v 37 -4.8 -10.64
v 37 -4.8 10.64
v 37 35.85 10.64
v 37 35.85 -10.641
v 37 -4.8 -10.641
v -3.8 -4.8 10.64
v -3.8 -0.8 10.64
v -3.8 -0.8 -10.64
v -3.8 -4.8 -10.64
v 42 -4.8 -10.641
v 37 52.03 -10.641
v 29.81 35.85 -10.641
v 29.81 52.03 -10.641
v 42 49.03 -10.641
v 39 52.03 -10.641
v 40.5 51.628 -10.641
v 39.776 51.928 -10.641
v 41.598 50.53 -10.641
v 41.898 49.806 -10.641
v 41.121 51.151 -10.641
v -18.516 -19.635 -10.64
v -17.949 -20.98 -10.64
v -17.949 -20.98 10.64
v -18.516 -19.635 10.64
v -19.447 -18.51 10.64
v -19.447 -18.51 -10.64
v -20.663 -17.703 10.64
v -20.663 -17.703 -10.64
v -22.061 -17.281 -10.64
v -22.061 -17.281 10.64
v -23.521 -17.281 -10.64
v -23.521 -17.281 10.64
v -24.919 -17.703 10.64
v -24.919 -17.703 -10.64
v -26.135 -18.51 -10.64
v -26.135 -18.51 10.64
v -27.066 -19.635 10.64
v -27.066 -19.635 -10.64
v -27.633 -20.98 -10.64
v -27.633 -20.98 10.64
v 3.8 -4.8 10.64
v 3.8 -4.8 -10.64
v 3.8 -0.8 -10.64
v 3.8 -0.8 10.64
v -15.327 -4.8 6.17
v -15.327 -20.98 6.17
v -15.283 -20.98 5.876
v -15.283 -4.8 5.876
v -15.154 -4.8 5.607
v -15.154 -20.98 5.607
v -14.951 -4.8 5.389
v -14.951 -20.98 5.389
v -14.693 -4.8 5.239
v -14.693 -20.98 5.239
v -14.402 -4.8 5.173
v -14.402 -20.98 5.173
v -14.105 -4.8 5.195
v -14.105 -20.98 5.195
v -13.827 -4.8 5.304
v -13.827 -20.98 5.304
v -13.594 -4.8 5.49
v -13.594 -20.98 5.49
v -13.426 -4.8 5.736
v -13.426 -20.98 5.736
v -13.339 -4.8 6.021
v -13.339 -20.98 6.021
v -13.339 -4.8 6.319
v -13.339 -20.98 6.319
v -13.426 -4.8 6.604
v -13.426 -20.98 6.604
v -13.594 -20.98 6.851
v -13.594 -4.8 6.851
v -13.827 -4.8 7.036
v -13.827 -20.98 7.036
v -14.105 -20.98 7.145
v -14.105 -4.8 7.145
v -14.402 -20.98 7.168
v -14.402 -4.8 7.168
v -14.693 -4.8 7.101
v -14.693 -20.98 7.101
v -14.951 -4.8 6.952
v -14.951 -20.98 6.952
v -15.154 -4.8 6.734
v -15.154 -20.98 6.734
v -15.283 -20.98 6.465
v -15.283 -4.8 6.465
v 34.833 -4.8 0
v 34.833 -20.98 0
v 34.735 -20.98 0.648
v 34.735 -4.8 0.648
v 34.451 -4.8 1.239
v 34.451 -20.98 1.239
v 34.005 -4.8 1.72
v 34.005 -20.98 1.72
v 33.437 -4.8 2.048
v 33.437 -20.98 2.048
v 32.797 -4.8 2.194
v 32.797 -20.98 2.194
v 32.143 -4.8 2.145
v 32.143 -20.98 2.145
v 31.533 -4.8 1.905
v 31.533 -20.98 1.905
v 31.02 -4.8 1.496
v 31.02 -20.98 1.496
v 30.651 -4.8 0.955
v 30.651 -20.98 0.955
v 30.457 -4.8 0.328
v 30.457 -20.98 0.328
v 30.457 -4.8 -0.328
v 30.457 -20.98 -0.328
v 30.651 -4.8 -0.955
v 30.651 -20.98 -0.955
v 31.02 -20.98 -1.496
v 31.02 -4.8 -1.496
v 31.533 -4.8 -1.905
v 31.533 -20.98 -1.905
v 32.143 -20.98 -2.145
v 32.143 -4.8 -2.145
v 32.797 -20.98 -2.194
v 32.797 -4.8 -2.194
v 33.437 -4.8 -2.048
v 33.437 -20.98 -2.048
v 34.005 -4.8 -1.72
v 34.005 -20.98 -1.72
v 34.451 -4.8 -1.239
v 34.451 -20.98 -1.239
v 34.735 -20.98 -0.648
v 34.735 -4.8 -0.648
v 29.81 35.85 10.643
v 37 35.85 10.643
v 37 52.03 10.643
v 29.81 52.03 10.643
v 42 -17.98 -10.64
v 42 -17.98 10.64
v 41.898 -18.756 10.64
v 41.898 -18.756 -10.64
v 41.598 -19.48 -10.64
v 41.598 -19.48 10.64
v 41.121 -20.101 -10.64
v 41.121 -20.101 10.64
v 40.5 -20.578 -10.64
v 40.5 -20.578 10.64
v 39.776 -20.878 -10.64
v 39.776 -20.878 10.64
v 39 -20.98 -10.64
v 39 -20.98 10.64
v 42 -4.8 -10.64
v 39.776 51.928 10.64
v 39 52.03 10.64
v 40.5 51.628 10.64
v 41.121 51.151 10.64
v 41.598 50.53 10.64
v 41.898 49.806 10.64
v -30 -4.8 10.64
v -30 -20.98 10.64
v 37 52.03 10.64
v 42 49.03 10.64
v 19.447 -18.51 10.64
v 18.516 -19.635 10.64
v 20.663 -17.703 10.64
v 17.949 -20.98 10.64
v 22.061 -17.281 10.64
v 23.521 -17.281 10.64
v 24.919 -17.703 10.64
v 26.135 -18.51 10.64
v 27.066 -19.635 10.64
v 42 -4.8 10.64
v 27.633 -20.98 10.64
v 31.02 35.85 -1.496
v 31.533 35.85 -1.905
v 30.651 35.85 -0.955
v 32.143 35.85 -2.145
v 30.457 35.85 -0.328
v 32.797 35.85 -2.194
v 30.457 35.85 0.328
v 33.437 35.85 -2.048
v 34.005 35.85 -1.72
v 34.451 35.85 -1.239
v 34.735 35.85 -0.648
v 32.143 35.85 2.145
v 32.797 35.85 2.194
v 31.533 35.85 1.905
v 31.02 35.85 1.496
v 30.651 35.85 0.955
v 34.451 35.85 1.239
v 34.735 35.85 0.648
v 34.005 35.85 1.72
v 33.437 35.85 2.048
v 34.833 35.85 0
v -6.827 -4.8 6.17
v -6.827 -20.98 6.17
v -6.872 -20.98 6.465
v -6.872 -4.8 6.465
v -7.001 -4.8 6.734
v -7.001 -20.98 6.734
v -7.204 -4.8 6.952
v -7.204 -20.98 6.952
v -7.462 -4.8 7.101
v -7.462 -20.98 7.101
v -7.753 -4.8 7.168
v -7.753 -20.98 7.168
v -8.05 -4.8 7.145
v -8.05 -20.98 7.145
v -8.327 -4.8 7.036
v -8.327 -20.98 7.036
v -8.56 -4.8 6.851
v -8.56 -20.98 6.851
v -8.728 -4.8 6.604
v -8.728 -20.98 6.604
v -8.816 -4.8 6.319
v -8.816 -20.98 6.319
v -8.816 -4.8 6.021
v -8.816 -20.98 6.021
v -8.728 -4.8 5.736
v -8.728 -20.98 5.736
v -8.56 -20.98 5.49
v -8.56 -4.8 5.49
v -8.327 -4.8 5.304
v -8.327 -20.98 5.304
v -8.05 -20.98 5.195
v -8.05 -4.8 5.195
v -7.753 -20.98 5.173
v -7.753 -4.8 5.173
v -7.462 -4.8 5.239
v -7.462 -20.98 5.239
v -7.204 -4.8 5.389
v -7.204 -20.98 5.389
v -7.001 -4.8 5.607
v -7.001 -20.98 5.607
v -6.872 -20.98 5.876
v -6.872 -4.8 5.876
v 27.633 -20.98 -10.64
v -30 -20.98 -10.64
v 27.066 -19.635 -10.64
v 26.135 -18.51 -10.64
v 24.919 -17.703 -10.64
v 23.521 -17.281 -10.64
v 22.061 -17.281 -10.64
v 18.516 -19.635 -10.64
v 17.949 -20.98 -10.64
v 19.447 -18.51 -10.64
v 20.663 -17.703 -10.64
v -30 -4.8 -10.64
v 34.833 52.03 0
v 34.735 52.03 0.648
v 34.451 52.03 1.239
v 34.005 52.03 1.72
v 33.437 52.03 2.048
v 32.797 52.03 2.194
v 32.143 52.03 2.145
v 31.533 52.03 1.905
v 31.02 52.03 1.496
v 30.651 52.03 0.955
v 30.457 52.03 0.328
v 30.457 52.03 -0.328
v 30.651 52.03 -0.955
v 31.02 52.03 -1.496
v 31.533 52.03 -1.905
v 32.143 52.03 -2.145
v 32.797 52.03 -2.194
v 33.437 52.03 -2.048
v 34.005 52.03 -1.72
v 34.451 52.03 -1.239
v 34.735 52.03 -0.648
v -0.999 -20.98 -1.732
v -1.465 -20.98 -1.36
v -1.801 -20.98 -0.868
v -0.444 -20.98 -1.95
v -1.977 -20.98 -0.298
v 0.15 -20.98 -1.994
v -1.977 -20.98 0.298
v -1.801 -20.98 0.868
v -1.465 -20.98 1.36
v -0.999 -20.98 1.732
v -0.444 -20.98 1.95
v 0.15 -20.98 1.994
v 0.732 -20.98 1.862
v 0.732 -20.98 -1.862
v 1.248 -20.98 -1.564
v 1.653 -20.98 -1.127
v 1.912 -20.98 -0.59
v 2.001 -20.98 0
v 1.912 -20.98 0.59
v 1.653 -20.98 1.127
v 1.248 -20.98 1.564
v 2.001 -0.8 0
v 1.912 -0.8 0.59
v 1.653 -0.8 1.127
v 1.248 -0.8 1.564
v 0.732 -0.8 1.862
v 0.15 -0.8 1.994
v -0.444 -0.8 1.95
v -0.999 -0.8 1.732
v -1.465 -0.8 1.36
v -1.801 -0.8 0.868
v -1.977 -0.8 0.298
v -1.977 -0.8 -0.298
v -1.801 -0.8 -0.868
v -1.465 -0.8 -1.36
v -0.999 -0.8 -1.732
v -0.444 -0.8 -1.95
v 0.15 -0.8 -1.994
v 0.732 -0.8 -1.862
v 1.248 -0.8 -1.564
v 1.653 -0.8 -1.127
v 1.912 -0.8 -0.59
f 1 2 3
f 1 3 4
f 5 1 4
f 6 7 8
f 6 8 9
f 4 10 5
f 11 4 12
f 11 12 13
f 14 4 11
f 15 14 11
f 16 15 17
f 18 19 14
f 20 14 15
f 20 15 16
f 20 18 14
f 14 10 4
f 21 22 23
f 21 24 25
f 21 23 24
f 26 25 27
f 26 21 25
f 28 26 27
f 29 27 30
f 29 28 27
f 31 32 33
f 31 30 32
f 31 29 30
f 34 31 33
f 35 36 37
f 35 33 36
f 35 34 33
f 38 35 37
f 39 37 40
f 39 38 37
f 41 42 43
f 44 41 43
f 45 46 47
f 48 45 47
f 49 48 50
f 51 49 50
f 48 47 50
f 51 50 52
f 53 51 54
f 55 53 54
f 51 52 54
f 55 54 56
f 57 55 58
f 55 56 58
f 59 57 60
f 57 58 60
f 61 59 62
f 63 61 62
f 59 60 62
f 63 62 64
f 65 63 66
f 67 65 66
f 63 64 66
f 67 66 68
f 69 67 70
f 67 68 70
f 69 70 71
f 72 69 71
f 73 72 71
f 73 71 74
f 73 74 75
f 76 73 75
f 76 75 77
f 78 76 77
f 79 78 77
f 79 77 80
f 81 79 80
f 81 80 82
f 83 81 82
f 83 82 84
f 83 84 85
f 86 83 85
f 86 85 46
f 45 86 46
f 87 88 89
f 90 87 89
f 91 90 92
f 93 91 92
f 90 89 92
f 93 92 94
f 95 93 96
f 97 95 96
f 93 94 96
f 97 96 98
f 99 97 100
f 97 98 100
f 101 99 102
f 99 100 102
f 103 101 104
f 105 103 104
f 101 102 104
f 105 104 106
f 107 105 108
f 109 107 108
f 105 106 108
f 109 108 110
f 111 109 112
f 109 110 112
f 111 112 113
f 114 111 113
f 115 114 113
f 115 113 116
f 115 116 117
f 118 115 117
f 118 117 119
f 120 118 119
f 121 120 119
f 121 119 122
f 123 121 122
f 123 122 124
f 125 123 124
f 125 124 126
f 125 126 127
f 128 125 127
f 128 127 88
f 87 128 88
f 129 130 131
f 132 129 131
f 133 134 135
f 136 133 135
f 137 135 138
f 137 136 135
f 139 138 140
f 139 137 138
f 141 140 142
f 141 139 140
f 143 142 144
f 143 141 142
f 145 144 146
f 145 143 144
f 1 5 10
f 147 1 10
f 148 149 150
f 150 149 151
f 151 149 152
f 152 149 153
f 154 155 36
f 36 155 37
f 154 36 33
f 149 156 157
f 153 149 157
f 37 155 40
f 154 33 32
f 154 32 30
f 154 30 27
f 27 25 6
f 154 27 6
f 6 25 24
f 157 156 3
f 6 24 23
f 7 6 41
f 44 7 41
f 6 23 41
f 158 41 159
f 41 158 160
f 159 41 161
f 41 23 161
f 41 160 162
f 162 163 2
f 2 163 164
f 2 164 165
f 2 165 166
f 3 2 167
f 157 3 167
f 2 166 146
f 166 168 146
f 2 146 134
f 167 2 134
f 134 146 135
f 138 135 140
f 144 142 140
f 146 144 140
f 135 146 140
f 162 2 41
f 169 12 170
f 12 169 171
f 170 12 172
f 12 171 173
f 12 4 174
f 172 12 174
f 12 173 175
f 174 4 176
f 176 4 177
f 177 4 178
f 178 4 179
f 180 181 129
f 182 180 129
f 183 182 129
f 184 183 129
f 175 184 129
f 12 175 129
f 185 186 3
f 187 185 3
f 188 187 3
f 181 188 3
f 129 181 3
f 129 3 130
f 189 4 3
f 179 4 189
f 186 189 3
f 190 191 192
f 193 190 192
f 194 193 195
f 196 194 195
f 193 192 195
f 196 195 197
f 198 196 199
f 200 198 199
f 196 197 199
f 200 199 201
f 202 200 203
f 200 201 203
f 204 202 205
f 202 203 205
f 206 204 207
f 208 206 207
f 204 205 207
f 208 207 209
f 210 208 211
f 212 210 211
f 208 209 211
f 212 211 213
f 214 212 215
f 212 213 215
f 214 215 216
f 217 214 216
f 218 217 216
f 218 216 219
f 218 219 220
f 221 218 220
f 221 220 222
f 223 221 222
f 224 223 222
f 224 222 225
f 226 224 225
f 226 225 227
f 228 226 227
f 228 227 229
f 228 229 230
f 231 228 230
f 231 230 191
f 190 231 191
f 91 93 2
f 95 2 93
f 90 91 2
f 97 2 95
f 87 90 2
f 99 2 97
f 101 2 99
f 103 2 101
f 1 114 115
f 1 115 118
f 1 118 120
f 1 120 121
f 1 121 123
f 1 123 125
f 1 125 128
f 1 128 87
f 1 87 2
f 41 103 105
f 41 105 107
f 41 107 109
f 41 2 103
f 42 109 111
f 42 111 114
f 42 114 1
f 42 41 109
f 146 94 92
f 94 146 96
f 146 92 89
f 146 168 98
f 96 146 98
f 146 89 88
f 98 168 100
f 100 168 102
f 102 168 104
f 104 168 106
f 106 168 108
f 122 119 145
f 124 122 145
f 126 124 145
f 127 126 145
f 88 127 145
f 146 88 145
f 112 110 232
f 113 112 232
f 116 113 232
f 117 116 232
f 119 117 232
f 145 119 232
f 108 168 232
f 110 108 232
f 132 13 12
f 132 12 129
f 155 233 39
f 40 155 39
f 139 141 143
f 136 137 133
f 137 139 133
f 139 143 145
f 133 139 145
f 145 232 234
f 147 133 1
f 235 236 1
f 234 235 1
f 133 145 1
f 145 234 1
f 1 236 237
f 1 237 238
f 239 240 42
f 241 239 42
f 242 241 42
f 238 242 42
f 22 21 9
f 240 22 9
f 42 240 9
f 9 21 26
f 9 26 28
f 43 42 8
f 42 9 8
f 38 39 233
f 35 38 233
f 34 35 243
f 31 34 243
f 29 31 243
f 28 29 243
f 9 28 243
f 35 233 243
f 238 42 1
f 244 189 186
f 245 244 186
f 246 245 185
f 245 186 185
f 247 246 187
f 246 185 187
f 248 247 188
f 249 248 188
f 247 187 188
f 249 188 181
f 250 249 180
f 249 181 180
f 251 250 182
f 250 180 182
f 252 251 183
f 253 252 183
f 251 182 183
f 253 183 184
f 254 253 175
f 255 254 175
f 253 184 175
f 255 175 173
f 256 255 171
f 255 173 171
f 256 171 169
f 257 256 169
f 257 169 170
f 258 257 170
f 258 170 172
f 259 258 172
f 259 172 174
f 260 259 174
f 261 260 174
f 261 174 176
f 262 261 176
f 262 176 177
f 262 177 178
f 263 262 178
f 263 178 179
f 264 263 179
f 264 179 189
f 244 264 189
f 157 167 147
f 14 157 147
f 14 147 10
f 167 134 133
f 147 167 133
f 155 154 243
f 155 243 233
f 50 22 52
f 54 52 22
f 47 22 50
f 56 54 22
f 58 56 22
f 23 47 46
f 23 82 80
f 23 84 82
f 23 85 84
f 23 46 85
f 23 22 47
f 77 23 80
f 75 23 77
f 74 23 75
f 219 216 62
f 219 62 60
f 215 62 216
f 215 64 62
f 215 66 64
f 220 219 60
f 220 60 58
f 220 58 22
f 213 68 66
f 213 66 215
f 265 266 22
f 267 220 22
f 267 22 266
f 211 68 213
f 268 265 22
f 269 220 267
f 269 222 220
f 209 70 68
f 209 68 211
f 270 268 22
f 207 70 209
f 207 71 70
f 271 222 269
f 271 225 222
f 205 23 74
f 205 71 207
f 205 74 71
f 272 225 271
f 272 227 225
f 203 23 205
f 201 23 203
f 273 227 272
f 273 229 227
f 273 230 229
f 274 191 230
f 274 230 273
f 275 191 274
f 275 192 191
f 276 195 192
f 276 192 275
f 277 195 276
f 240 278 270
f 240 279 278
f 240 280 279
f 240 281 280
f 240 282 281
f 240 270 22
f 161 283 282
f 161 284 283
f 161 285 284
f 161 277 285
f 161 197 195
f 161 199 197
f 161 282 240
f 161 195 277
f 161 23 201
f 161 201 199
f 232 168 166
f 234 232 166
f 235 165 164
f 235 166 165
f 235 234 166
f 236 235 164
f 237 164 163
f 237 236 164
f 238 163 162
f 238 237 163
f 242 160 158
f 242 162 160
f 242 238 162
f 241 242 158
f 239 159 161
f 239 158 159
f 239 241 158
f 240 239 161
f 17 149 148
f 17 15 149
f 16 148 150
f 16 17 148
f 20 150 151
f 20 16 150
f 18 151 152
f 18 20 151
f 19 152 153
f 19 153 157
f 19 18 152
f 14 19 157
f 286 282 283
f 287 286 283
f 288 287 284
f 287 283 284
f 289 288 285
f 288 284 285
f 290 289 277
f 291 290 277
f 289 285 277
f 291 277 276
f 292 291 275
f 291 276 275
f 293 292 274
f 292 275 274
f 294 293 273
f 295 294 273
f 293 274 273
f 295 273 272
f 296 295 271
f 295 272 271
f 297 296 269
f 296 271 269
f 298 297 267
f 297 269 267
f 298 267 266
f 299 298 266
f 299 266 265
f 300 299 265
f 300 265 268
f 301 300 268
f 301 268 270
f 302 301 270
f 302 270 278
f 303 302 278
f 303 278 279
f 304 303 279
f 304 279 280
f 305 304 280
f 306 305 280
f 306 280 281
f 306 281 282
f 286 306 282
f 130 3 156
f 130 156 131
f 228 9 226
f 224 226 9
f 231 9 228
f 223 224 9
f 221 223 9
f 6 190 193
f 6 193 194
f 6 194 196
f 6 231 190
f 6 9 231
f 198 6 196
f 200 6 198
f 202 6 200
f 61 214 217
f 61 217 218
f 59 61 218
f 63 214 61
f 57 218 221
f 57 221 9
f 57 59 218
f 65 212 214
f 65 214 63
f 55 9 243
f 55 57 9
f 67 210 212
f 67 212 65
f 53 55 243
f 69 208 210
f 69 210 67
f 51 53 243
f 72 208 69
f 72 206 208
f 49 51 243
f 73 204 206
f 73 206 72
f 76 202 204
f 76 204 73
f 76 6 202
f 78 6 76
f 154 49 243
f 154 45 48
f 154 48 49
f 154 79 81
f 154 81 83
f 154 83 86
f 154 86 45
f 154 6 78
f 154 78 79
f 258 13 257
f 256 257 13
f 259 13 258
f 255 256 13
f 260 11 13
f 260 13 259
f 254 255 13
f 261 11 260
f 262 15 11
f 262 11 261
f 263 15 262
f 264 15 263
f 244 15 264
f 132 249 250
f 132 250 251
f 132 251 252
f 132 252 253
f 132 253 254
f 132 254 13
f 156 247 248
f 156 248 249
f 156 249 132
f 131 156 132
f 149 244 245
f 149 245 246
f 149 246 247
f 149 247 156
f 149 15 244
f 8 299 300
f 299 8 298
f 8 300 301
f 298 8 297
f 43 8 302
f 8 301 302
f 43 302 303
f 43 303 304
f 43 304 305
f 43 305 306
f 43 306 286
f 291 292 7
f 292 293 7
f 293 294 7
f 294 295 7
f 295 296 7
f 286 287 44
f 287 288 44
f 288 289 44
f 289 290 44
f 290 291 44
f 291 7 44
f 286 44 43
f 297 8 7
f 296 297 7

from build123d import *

# Parameters (mm, degrees)
BOSS_EXTRUDE1_DEPTH     = 10.8
BOSS_EXTRUDE2_DEPTH     = 10.64
CUT_EXTRUDE1_DEPTH      = 39.168054705
CUT_EXTRUDE1_DEPTH_BACK = 39.168054705
SKETCH5_R               = 5
FILLET1_R               = 1
SKETCH6_W               = 21.28
SKETCH6_H               = 16.18
BOSS_EXTRUDE3_DEPTH     = 12
SKETCH7_W               = 5
SKETCH7_H               = 21.281328743
BOSS_EXTRUDE4_DEPTH     = 56.83
SKETCH8_W               = 21.284331222
SKETCH8_H               = 16.18
BOSS_EXTRUDE5_DEPTH     = 7.19
FILLET3_R               = 3
SKETCH9_R               = 2.2
CUT_EXTRUDE2_DEPTH      = 85.918196519
SKETCH10_R              = 2
CUT_EXTRUDE3_DEPTH      = 85.918196519
SKETCH11_W              = 24.977296572
SKETCH11_H              = 9.721484234
CUT_EXTRUDE4_DEPTH      = 71.220021919
CUT_EXTRUDE5_REACH      = 86.898


with BuildPart() as part:
    # Sketch2 → Boss-Extrude1 (new body)
    with BuildSketch(Plane.XY):
        Polygon((-10.1, 0), (0, 0), (0, 7), (-6.25480432, 7), (-10.1, 1.709943763), align=None)
        Polygon((0, 0), (10.1, 0), (10.1, 1.709943763), (6.25480432, 7), (0, 7), align=None)
    extrude(amount=BOSS_EXTRUDE1_DEPTH)

    # Sketch4 → Boss-Extrude2 (add, symmetric)
    with BuildSketch(Plane.XY):
        Polygon((-3.8, 0), (-3.8, -4.8), (-30, -4.8), (-30, -20.98), (30, -20.98), (30, -4.8), (3.8, -4.8), (3.8, 0), align=None)
    extrude(amount=BOSS_EXTRUDE2_DEPTH, both=True)

    # Sketch5 → Cut-Extrude1 (cut, two sides: drawn at the far end of the back side and taken through both)
    with BuildSketch(Plane.XY.offset(-CUT_EXTRUDE1_DEPTH_BACK)):
        with Locations((-22.790976064, -22.227391232)):
            Circle(SKETCH5_R)
        with Locations((22.790976064, -22.227391232)):
            Circle(SKETCH5_R)
    extrude(amount=CUT_EXTRUDE1_DEPTH + CUT_EXTRUDE1_DEPTH_BACK, mode=Mode.SUBTRACT)

    # Fillet1
    fillet1_edges = [part.edges().sort_by_distance(p)[0] for p in [
        (-10.1, 0, 5.4),
        (-10.1, 1.709943763, 5.4),
        (-6.25480432, 7, 5.4),
        (6.25480432, 7, 5.4),
        (10.1, 1.709943763, 5.4),
        (10.1, 0, 5.4),
    ]]
    fillet(fillet1_edges, radius=FILLET1_R)

    # Sketch6 → Boss-Extrude3 (add)
    with BuildSketch(Plane(origin=(30, 0, 0), x_dir=(0, 0, -1), z_dir=(1, 0, 0))):
        with Locations((0, -12.89)):
            Rectangle(SKETCH6_W, SKETCH6_H)
    extrude(amount=BOSS_EXTRUDE3_DEPTH)

    # Sketch7 → Boss-Extrude4 (add)
    with BuildSketch(Plane(origin=(0, -4.8, 0), x_dir=(1, 0, 0), z_dir=(0, 1, 0))):
        with Locations((39.5, 0.000664372)):
            Rectangle(SKETCH7_W, SKETCH7_H)
    extrude(amount=BOSS_EXTRUDE4_DEPTH)

    # Sketch8 → Boss-Extrude5 (add)
    with BuildSketch(Plane.ZY.offset(-37)):
        with Locations((0.000836868, 43.94)):
            Rectangle(SKETCH8_W, SKETCH8_H)
    extrude(amount=BOSS_EXTRUDE5_DEPTH)

    # Fillet3
    fillet3_edges = [part.edges().sort_by_distance(p)[0] for p in [
        (42, -20.98, 0),
        (42, 52.03, -0.000664372),
    ]]
    fillet(fillet3_edges, radius=FILLET3_R)

    # Sketch9 → Cut-Extrude2 (cut, through all)
    with BuildSketch(Plane.XZ.offset(20.98)):
        with Locations((32.632878078, 0)):
            Circle(SKETCH9_R)
    extrude(amount=-CUT_EXTRUDE2_DEPTH, mode=Mode.SUBTRACT)

    # Sketch10 → Cut-Extrude3 (cut, through all)
    with BuildSketch(Plane.XZ.offset(20.98)):
        with Locations((0.000925951, 0)):
            Circle(SKETCH10_R)
    extrude(amount=-CUT_EXTRUDE3_DEPTH, mode=Mode.SUBTRACT)

    # Sketch11 → Cut-Extrude4 (cut, through all)
    with BuildSketch(Plane.XY.offset(10.8)):
        with Locations((-0.121132817, 4.060742117)):
            Rectangle(SKETCH11_W, SKETCH11_H)
    extrude(amount=-CUT_EXTRUDE4_DEPTH, mode=Mode.SUBTRACT)

    # Sketch13 → Cut-Extrude5 (cut, up to next)
    with BuildSketch(Plane.XZ.offset(20.98), mode=Mode.PRIVATE) as cut_extrude5_sk1:
        with BuildLine():
            ThreePointArc((-8.827441341, 6.170359992), (-7.827441341, 5.170359992), (-6.827441341, 6.170359992))
            ThreePointArc((-6.827441341, 6.170359992), (-7.827441341, 7.170359992), (-8.827441341, 6.170359992))
        make_face()
    cut_extrude5_tool1 = extrude(cut_extrude5_sk1.sketch, amount=-CUT_EXTRUDE5_REACH, mode=Mode.PRIVATE) & part.part
    # Sketch13 → Cut-Extrude5 (cut, up to next)
    with BuildSketch(Plane.XZ.offset(20.98), mode=Mode.PRIVATE) as cut_extrude5_sk2:
        with BuildLine():
            ThreePointArc((-13.327441341, 6.170359992), (-14.327441341, 7.170359992), (-15.327441341, 6.170359992))
            ThreePointArc((-15.327441341, 6.170359992), (-14.327441341, 5.170359992), (-13.327441341, 6.170359992))
        make_face()
    cut_extrude5_tool2 = extrude(cut_extrude5_sk2.sketch, amount=-CUT_EXTRUDE5_REACH, mode=Mode.PRIVATE) & part.part
    add(cut_extrude5_tool1.solids().sort_by_distance((-7.827441, -20.98, 6.17036))[0], mode=Mode.SUBTRACT)
    add(cut_extrude5_tool2.solids().sort_by_distance((-14.327441, -20.98, 6.17036))[0], mode=Mode.SUBTRACT)


solid = part.part
